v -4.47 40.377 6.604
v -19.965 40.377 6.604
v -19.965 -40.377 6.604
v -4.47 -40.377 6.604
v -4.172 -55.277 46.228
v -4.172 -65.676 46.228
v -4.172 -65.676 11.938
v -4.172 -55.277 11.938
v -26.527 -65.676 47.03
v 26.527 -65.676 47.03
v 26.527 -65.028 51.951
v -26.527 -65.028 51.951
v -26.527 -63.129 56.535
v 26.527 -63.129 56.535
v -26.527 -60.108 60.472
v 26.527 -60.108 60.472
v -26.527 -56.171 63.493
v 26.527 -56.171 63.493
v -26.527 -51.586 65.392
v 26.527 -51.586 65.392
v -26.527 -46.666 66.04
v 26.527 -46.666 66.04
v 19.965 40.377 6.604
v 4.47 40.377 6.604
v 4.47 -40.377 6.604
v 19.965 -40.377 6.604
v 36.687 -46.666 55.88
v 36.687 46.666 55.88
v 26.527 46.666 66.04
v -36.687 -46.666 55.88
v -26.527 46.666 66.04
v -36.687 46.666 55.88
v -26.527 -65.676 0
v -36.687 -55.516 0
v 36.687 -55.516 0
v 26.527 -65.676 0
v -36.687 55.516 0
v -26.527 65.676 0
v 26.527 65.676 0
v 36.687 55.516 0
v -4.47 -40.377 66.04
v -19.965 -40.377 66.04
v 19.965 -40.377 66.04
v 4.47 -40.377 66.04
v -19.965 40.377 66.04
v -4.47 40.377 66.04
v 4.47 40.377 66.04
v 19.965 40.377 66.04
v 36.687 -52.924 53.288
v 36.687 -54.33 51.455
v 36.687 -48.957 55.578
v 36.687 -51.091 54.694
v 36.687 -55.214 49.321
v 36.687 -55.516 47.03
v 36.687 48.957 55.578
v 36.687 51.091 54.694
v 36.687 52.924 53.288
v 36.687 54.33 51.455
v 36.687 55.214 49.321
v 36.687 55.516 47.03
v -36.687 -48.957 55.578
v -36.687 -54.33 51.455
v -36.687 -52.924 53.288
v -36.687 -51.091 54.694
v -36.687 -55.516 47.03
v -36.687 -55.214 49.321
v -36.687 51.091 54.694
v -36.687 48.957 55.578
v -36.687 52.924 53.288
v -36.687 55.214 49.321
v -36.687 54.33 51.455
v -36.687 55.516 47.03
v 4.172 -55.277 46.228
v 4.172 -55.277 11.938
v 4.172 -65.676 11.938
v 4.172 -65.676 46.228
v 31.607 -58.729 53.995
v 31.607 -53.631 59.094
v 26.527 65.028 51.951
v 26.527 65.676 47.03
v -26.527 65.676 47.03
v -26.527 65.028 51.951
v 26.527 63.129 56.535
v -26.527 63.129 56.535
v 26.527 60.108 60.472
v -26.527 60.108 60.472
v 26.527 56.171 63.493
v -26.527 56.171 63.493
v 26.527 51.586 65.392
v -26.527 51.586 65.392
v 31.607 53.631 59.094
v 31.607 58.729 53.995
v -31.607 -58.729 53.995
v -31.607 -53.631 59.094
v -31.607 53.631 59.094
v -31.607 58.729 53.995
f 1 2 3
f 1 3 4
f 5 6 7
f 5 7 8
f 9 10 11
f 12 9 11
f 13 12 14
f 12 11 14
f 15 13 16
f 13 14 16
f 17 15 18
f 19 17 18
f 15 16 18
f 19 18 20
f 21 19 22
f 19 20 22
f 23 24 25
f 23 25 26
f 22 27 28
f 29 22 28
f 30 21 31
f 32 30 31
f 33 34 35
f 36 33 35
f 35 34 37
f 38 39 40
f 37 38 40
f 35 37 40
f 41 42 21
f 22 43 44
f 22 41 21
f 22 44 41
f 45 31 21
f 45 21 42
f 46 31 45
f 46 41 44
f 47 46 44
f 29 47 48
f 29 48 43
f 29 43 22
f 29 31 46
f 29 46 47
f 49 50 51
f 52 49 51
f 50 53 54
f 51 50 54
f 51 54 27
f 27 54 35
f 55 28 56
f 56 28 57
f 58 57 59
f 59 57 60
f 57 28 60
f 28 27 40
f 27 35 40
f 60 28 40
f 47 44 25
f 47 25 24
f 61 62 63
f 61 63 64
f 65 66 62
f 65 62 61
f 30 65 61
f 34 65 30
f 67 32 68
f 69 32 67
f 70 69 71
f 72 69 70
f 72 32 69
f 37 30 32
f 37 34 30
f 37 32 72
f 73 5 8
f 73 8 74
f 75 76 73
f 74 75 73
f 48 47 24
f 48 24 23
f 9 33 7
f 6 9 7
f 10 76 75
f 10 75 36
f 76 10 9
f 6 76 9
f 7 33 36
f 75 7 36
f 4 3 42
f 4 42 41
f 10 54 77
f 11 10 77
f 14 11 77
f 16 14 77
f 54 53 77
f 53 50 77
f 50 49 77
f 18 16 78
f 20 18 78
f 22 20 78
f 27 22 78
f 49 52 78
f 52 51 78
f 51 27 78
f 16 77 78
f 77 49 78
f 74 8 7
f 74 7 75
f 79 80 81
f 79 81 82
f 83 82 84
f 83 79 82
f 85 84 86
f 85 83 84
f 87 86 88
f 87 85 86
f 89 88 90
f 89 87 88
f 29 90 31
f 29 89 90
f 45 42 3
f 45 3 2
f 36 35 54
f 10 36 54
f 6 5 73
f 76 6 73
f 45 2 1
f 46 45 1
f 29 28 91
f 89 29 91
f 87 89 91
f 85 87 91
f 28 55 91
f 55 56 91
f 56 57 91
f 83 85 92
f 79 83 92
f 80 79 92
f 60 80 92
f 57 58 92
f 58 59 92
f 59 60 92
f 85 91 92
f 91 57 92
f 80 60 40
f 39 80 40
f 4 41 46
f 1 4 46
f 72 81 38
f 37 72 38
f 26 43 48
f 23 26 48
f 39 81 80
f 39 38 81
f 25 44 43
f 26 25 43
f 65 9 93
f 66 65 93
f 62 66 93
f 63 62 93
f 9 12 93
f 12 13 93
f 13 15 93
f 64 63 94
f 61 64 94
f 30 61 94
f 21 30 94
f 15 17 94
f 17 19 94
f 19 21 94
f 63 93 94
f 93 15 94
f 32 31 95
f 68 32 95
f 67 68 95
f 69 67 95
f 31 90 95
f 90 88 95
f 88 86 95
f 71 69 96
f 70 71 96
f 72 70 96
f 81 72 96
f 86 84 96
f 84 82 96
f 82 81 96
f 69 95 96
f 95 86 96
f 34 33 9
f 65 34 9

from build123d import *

# Parameters (mm, degrees)
F0_W     = 73.3732283115
F0_H     = 131.3513368368
F1_DEPTH = 66.04
F2_R     = 19.0095175901
F3_SIZE  = 10.16
F4_W     = 15.4954213649
F4_H     = 80.7549729943
F5_DEPTH = 59.436
F7_START = -19.812
F6_W     = 8.3436891437
F6_H     = 37.5465899706
F7_DEPTH = 34.29


with BuildPart() as f1:
    # F0 (on Top) → F1 (new body)
    with BuildSketch(Plane.XY):
        Rectangle(F0_W, F0_H)
    extrude(amount=F1_DEPTH)

    # F2
    f2_edges = [f1.edges().sort_by_distance(p)[0] for p in [
        (0, 65.675668, 66.04),
        (0, -65.675668, 66.04),
    ]]
    fillet(f2_edges, radius=F2_R)

    # F3
    f3_edges = [f1.edges().sort_by_distance(p)[0] for p in [
        (-36.686614, 0, 66.04),
        (-36.686614, 60.10791, 60.472241),
        (-36.686614, 65.675668, 23.515241),
        (-36.686614, -60.10791, 60.472241),
        (-36.686614, -65.675668, 23.515241),
        (36.686614, 0, 66.04),
        (36.686614, 60.10791, 60.472241),
        (36.686614, 65.675668, 23.515241),
        (36.686614, -60.10791, 60.472241),
        (36.686614, -65.675668, 23.515241),
    ]]
    chamfer(f3_edges, length=F3_SIZE)

    # F4 (on face) → F5 (cut)
    with BuildSketch(Plane.XY.offset(66.04)):
        with Locations((12.2175393626, 0)):
            Rectangle(F4_W, F4_H)
        with Locations((-12.2175393626, 0)):
            Rectangle(F4_W, F4_H)
    extrude(amount=-F5_DEPTH, mode=Mode.SUBTRACT)

    # F6 (on face) → F7 (cut)
    with BuildSketch(Plane.XY.offset(66.04).offset(F7_START)):
        with Locations((0, -74.0502253175)):
            Rectangle(F6_W, F6_H)
    extrude(amount=-F7_DEPTH, mode=Mode.SUBTRACT)


solid = f1.part
